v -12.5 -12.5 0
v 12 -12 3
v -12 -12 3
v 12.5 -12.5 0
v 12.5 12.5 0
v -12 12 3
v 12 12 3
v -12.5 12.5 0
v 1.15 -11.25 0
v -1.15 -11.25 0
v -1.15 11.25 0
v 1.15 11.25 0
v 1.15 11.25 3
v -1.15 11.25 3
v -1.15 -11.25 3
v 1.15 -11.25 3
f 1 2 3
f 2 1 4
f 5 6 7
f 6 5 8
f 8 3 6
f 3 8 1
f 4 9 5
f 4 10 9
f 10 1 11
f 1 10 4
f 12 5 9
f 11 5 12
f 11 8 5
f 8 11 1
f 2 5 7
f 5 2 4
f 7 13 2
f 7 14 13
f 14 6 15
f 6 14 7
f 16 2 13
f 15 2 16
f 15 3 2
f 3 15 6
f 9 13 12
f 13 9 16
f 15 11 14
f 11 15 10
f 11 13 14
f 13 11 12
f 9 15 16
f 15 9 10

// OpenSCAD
// Ultimate Parametric Base Generator and Customizer Script
// developed by Daniel Joyce
// Creative Commons Share Alike + Attribution
// Please see LICENSE.md
// 3D-Miniatures.com

/* [Base] */

// Polygon
base_style = 4; // [3:triangle,4:square,5:pentagon,6:hexagon,7:heptagon,8:octagon,50:round]

// Base diameter,
diameter = 25; // [15:250]

// Thickness of base, ~3 mm is standard:
thickness = 3; // [1:25]

/* [Slot or Stand] */

// Should base have a slot or stand?
slot = 1; // [0:Neither, 1:Slot, 2:Stand]

// Orientation of slot
slot_orientation = 1; // [1:style 1, 2:style 2]

// Normally 25 mm square / hex base diameter is measured side to side:
across_sides = 1; // [0:no, 1:yes]

// Stand height in mm from ground, does not include peg length
stand_height = 28; // [10:112]

// Diameter of peg in tenths of mm
peg_diameter = 10; // [10:100]

// Length of peg in mm
peg_height = 5; // [2:10]


/* [Texture] */

// File for surface texture
texture_filename = "texture.dat"; // [image_surface:100x100]

// How much to scale the texture vertically, 10 = no scaling
texture_scale = 10; // [1:50]

// How much the texture is moved up/down the top of the base
panel_offset = 0; // [-20:20]

/* [Hidden] */

radius = diameter / 2;

cos_r = cos(360/(2*base_style));

scale_factor = across_sides == 0 ? 1 : 1 / cos_r;

offset = (diameter * scale_factor) + 2;

module texture(diameter, texture_scale) {
  scale_factor = (diameter+0.5)/100;
  scale([scale_factor,scale_factor,texture_scale]) {
    surface(file=texture_filename, center=true);
  }
}


module texture_panel(sides, diameter, texture_scale){
  radius = diameter/2;
  intersection(){
    cylinder(h=20,r=radius, $fn=sides);
    translate([0,0,1]) texture(diameter, texture_scale);
  }
}

module stand(stand_height, peg_height, peg_diam) {
  peg_r = peg_diam / 2;
  stand_r2 = peg_r +.5;
  stand_r1 = peg_r +1;
  union(){
    // peg
    cylinder(r1=peg_r, r2=peg_r,h=stand_height+peg_height, $fn=50);
    cylinder(r1=stand_r1, r2=stand_r2, h=stand_height - 0.01, $fn=50);
  }
}


module base(sides,
  diameter = 25,
  slot = false,
  stand = false,
  height = 3.33,
  slot_x = true,
  stand_height = 40,
  peg_height = 4,
  peg_diameter = 2,
  inset = false,
  texture_scale = 1.0,
  panel_offset = -0.4){
  radius = diameter / 2;
  cos_r = cos(360/(2*sides));

  scale_factor = inset ? 1 : 1 / cos_r;
  slot_width = cos(360/(2*sides))*diameter*0.9*scale_factor;
  slot_r = slot_x ? 0 : 90;
  top_radius = radius - 0.5;
  difference(){
    scale([scale_factor,scale_factor,1]) rotate([0,0,360/(2*sides)]) {
      union(){
        if(stand){
          translate([0,0,0.5]){
            stand(stand_height-0.5, peg_height, peg_diameter);
          }
        }
        cylinder(h = height, r1=radius, r2=top_radius, $fn=sides);
        translate([0,0,height-1+panel_offset]){
          texture_panel(sides=sides,
                    diameter=diameter-1,
                    texture_scale=texture_scale);
        }
      }
    }
    if(slot){
      rotate([0,0, slot_r]) cube([2.3,slot_width,height+10], center=true);
    }
  }
}


base(base_style,
    diameter = diameter,
    slot = (slot == 1),
    stand = (slot == 2),
    height = thickness,
    inset = (across_sides == 0),
    stand_height = stand_height,
    peg_height = peg_height,
    peg_diameter = peg_diameter/10,
    slot_x = (slot_orientation == 1),
    panel_offset = panel_offset/10,
    texture_scale = texture_scale/10);
